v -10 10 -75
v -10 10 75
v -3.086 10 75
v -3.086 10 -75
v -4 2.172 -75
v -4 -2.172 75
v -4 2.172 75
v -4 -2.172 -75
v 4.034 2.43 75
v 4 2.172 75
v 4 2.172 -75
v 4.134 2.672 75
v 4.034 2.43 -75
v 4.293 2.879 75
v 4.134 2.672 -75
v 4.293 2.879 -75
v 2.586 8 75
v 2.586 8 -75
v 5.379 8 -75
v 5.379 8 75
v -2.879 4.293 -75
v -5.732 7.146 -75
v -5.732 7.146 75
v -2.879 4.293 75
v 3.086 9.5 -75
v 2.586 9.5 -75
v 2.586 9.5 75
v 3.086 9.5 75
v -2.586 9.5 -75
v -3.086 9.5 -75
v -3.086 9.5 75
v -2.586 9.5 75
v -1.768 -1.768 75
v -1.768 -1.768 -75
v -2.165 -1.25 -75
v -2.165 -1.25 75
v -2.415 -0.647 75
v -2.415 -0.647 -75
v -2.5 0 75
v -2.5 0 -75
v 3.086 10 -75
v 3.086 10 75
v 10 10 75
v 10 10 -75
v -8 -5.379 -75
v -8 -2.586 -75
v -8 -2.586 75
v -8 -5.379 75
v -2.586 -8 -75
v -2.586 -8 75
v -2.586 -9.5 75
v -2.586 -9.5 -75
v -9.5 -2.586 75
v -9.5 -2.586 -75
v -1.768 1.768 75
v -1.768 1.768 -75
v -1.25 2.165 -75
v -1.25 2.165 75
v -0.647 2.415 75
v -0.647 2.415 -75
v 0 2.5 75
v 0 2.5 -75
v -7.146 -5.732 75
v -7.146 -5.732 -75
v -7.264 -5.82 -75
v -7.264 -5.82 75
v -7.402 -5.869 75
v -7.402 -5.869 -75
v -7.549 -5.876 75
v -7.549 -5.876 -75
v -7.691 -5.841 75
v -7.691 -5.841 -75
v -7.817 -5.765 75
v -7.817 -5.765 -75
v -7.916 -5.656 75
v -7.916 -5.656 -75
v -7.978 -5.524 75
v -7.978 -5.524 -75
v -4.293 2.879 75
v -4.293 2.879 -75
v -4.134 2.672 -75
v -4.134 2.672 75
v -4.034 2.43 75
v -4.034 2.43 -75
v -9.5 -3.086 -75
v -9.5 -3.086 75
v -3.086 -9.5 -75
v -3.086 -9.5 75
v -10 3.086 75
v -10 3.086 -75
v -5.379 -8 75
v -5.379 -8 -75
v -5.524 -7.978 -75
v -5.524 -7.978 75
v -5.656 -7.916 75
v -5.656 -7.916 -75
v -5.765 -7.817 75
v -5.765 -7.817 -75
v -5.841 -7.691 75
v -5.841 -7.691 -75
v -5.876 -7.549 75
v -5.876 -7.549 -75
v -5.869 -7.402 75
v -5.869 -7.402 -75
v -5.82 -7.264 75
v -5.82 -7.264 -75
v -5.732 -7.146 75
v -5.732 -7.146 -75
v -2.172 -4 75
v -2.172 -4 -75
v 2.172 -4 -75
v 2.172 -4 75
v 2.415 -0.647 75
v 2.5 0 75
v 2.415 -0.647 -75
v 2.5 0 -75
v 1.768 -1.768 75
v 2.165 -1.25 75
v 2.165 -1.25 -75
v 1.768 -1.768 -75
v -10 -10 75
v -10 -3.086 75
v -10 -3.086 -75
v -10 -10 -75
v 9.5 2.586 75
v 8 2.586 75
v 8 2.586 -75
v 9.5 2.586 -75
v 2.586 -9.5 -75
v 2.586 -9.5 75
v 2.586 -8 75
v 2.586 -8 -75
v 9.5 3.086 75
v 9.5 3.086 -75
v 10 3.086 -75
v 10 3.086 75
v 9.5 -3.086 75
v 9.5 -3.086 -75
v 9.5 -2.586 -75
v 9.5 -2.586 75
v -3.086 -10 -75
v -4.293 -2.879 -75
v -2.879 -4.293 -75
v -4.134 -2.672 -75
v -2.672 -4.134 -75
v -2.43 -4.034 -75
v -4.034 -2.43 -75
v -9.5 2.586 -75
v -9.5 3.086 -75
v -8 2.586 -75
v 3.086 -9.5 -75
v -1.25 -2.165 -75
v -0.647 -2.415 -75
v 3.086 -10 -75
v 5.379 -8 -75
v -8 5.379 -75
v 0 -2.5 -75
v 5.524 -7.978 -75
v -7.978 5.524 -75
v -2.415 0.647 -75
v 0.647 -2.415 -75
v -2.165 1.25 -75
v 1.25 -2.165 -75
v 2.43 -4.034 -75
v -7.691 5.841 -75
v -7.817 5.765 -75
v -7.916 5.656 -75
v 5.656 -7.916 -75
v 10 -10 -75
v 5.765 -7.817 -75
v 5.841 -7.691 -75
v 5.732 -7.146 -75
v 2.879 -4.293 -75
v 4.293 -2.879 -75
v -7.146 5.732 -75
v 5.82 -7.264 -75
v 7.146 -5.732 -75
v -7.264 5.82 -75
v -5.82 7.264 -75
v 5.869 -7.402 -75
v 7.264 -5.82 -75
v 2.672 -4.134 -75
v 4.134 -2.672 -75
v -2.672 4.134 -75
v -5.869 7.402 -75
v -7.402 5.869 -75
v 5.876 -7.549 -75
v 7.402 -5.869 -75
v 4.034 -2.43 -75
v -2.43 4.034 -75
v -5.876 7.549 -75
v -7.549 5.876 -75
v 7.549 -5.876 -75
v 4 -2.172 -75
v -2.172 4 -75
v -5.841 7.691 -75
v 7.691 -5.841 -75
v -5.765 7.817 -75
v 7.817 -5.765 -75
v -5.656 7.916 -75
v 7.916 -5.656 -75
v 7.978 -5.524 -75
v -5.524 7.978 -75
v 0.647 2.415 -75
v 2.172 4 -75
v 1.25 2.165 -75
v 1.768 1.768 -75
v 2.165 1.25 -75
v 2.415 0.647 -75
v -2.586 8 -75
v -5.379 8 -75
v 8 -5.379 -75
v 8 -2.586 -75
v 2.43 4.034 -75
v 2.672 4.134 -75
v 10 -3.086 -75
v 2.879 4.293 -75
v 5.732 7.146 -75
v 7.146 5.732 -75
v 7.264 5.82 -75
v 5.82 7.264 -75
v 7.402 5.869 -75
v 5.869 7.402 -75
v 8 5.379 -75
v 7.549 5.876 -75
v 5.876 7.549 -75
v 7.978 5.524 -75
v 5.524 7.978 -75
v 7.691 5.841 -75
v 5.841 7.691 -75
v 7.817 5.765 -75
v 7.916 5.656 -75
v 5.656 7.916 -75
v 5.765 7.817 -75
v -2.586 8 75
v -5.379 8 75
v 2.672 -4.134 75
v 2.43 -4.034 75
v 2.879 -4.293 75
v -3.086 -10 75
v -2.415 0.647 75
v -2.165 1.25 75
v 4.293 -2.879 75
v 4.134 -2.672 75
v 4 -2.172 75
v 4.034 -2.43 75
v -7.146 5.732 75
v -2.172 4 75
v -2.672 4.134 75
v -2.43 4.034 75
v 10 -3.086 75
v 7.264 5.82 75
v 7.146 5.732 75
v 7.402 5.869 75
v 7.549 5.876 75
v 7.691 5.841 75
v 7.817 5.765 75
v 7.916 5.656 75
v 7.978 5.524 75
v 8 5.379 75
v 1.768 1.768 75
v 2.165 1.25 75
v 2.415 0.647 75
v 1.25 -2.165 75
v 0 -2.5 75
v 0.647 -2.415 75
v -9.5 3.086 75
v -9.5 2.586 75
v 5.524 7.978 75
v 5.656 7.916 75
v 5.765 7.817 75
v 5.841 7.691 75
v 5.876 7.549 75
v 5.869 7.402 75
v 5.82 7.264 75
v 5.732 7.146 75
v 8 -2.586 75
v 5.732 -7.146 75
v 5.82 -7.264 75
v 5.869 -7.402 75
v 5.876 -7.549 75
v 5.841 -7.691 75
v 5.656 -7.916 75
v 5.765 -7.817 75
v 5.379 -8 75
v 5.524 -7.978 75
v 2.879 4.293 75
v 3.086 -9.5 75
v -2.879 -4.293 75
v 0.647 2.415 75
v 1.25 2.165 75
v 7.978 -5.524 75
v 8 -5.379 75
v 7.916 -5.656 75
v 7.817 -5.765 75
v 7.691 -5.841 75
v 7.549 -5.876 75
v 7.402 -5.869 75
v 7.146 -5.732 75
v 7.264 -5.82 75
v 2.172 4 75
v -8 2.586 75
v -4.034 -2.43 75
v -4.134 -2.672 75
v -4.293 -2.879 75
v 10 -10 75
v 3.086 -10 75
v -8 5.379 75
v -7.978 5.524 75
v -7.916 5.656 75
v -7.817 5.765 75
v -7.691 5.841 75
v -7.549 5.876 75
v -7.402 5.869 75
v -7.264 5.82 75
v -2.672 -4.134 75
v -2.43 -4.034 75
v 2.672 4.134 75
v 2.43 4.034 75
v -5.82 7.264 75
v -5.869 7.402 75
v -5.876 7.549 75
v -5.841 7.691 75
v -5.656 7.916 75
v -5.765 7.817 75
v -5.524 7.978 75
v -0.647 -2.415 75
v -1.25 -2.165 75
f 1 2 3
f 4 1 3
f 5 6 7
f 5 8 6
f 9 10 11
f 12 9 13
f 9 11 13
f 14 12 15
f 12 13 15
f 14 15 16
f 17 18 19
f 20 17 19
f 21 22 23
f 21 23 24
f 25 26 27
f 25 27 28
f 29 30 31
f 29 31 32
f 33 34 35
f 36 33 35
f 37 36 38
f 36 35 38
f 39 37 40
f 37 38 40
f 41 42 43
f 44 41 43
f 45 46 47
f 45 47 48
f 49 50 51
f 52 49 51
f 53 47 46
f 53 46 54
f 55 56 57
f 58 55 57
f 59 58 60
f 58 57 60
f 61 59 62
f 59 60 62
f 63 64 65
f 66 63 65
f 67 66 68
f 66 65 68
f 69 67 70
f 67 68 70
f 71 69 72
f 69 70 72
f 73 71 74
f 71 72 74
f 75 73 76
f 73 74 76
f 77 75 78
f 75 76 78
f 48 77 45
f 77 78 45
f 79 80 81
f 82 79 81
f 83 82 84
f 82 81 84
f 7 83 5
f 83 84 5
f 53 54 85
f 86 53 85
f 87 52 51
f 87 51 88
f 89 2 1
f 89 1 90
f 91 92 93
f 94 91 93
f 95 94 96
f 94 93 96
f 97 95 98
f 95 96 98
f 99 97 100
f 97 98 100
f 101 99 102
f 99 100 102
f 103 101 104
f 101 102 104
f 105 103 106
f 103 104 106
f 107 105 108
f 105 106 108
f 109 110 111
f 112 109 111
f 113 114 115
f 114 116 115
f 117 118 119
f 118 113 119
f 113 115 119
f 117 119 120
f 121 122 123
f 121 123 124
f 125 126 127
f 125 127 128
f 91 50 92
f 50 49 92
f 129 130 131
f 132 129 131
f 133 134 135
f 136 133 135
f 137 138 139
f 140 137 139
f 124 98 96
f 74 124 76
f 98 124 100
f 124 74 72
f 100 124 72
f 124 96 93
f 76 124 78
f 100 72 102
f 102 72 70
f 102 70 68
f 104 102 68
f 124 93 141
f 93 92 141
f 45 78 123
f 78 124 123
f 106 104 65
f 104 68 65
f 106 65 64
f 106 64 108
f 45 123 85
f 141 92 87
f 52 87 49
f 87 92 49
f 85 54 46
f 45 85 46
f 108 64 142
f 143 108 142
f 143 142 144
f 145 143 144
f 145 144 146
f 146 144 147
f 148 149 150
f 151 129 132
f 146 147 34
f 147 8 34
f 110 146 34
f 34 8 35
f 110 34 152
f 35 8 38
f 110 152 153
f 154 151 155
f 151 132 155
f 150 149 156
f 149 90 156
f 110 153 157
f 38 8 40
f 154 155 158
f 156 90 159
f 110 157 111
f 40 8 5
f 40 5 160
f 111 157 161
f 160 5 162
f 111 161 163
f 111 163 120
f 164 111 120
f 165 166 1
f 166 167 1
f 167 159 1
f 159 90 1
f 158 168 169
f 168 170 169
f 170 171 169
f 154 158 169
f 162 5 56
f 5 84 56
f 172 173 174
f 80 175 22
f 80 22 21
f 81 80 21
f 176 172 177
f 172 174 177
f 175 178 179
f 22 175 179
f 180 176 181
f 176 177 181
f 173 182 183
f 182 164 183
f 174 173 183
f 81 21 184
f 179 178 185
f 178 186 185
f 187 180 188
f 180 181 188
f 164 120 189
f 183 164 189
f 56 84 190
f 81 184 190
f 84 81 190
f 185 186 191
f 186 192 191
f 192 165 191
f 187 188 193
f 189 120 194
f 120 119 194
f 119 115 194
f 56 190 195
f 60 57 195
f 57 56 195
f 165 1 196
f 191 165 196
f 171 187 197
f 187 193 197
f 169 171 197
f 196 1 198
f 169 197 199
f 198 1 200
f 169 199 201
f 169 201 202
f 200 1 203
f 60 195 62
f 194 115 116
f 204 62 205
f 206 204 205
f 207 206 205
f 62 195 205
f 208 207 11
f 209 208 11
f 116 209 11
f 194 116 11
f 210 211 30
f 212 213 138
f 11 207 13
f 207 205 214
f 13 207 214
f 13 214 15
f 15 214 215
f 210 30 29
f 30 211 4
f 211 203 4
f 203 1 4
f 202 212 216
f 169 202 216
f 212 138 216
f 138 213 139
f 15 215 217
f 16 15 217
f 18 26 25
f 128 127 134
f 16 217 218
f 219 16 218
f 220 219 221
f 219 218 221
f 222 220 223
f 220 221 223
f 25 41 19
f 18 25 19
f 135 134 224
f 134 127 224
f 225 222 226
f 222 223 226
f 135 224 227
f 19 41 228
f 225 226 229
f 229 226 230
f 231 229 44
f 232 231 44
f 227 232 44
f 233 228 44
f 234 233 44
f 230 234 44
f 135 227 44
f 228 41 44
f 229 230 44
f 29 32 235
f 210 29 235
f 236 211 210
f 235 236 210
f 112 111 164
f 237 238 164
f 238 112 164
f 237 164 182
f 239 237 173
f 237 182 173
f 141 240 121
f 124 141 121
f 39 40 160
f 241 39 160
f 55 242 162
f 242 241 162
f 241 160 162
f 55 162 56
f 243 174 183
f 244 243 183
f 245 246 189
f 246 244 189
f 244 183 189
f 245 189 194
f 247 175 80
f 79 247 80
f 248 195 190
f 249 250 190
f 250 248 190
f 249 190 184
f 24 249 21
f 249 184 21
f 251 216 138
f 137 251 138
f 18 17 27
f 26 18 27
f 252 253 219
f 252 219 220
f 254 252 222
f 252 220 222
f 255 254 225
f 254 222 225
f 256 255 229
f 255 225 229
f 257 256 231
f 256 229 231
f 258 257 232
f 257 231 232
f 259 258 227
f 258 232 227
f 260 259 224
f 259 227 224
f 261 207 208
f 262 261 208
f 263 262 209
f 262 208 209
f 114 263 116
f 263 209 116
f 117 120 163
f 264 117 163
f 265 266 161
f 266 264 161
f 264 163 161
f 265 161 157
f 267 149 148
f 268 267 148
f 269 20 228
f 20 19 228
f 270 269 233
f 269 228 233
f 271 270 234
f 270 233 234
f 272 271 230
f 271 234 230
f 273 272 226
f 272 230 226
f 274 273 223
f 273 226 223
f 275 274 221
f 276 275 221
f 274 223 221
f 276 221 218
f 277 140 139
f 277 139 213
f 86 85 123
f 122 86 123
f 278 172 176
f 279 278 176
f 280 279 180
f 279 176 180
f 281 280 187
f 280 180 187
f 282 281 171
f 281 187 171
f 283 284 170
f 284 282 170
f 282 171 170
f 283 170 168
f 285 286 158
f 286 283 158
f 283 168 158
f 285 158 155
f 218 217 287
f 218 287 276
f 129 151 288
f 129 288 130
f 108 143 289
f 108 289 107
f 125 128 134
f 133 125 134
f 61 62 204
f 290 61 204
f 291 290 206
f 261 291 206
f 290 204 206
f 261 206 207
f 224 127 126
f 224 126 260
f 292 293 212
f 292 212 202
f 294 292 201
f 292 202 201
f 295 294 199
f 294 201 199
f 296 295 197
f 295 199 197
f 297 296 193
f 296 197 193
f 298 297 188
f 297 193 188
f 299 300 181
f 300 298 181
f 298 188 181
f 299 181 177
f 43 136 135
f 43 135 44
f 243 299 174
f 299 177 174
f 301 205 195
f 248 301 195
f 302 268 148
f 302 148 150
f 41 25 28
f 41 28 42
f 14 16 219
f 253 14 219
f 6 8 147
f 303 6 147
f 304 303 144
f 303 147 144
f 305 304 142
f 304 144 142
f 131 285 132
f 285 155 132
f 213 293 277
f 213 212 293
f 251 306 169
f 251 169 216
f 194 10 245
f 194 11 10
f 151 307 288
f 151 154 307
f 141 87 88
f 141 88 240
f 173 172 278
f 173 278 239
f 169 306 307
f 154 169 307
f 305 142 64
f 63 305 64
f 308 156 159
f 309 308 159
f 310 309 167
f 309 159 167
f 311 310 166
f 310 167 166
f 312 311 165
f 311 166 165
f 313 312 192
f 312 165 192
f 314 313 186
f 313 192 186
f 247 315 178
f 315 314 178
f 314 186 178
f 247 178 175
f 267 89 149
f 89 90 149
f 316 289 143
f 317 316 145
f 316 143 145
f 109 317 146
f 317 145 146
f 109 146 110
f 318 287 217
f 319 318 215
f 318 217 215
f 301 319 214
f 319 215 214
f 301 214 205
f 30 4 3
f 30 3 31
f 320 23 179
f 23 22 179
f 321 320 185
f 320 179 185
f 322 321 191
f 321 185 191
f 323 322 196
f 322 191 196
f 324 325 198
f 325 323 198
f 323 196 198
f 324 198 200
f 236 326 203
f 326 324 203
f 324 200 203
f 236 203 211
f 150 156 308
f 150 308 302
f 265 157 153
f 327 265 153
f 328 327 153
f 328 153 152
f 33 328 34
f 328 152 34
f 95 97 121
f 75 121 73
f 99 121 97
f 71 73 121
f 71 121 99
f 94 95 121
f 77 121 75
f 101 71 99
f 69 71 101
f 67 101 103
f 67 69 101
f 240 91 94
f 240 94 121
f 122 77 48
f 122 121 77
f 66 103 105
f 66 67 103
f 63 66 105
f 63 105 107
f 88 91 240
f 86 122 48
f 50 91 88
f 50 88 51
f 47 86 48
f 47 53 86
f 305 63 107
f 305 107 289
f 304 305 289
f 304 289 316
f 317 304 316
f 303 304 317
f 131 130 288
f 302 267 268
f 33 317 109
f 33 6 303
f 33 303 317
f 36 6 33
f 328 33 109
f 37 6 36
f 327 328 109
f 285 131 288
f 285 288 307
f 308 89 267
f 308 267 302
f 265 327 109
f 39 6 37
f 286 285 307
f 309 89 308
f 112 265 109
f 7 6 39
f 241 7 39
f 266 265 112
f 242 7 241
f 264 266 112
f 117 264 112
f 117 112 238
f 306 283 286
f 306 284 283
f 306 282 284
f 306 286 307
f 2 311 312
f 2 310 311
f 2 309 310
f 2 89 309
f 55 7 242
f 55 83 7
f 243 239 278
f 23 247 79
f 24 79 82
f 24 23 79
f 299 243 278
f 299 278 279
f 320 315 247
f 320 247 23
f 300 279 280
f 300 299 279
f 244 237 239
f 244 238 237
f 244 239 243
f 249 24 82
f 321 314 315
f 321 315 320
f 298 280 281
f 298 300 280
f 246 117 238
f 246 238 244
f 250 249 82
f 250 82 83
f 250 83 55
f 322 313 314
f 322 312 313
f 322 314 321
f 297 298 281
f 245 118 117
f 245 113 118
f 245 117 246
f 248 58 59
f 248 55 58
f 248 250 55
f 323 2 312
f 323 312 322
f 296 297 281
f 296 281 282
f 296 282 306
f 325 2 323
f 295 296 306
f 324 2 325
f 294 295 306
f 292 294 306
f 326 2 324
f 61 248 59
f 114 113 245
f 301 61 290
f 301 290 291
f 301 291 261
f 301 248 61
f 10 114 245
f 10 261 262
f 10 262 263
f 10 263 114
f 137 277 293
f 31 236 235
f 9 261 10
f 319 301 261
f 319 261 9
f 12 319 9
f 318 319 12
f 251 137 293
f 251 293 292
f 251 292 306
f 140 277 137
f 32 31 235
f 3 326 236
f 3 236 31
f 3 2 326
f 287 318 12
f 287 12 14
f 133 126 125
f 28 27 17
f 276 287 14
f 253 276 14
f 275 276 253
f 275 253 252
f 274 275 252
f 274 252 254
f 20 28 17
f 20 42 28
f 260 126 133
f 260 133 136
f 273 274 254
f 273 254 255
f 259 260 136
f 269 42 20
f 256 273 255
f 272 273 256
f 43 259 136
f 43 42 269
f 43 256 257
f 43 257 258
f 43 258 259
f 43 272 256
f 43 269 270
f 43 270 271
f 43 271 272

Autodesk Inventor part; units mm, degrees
sketch "Sketch1" plane through (0, 0, 0) normal (0, 0, 1) x (1, 0, 0)
  line L0 (-10, 10) -> (10, 10) construction
  circle A0 centre (0, 0) radius 2.5 construction
  line L1 (4, 4) -> (-4, 4) construction
  line L2 (0, 0) -> (-10, 10) construction
  line L3 (-2.5858, 4) -> (-6.5858, 8) construction
  line L4 (-10, 10) -> (-4, 4)
  line L5 (-6.5858, 8) -> (-2.5858, 8) construction
  line L6 (-2.5858, 8) -> (-2.5858, 10) construction
  line L7 (-2.5858, 10) -> (-3.0858, 10) construction
  line L8 (-3.0858, 10) -> (-3.0858, 9.5)
  line L9 (-3.0858, 9.5) -> (-2.5858, 9.5)
  line L10 (-2.5858, 9.5) -> (-2.5858, 10) construction
  line L11 (-2.5858, 9.5) -> (-2.5858, 8)
  line L12 (-10, 10) -> (-3.0858, 10)
  line L13 (-4, 4) -> (-4, 0) construction
  line L14 (-10, 10) -> (-16.9142, 10)
  line L15 (0, 4) -> (-2.5858, 4)
  arc A1 (0, 2.5) -> (-1.7678, 1.7678) centre (0, 0) ccw
  line L16 (-4, 4) -> (-1.7678, 1.7678)
  line L17 (0, 4) -> (0, 2.5)
  circle A2 centre (0, 0) radius 2.5 construction
  line L18 (-4, -4) -> (-4, 4) construction
  line L19 (-4, 2.5858) -> (-8, 6.5858) construction
  line L20 (-8, 6.5858) -> (-8, 2.5858) construction
  line L21 (-8, 2.5858) -> (-10, 2.5858) construction
  line L22 (-10, 2.5858) -> (-10, 3.0858) construction
  line L23 (-10, 3.0858) -> (-9.5, 3.0858)
  line L24 (-9.5, 3.0858) -> (-9.5, 2.5858)
  line L25 (-9.5, 2.5858) -> (-10, 2.5858) construction
  line L26 (-9.5, 2.5858) -> (-8, 2.5858)
  line L27 (-10, 10) -> (-10, 3.0858)
  line L28 (-4, 4) -> (0, 4) construction
  line L29 (-10, 10) -> (-10, 16.9142)
  line L30 (-4, 0) -> (-4, 2.5858)
  arc A3 (-1.7678, 1.7678) -> (-2.5, 0) centre (0, 0) ccw
  line L31 (-4, 0) -> (-2.5, 0)
  arc A4 (-5.3787, 8) -> (-5.7322, 7.1464) centre (-5.3787, 7.5) ccw
  arc A5 (-7.1464, 5.7322) -> (-8, 5.3787) centre (-7.5, 5.3787) ccw
  arc A6 (-2.8787, 4.2929) -> (-2.1716, 4) centre (-2.1716, 5) ccw
  arc A7 (-4, 2.1716) -> (-4.2929, 2.8787) centre (-5, 2.1716) ccw
  line L32 (-8, 5.3787) -> (-8, 2.5858)
  line L33 (-7.1464, 5.7322) -> (-4.2929, 2.8787)
  line L34 (-5.7322, 7.1464) -> (-2.8787, 4.2929)
  line L35 (-5.3787, 8) -> (-2.5858, 8)
  point P0 (0, 10)
  point P1 (-10, 0)
  point P2 (-2.1716, 4)
  dimension "d0" = 20
  dimension "d1" = 10
  dimension "d2" = 5
  dimension "d3" = 6
  dimension "d20" = 1
  dimension "d21" = 2
  dimension "d25" = 0.5
  dimension "d38" = 0.5
  dimension "d39" = 1
extrude "Extrusion1" add sketch "Sketch1" along normal mid plane 150
mirror "Mirror1" about plane through (0, 0, 0) normal (1, 0, 0) of "Extrusion1"
mirror "Mirror2" about plane through (0, 0, 0) normal (0, 1, 0) of "Extrusion1", "Mirror1"
sketch "Sketch2" plane through (0, 0, 0) normal (0, 0, 1) x (1, 0, 0)
  point P0 (0, 0)
equation "\"d1\" = 0.5 * d0"
properties part number "Perfil 20_500"
